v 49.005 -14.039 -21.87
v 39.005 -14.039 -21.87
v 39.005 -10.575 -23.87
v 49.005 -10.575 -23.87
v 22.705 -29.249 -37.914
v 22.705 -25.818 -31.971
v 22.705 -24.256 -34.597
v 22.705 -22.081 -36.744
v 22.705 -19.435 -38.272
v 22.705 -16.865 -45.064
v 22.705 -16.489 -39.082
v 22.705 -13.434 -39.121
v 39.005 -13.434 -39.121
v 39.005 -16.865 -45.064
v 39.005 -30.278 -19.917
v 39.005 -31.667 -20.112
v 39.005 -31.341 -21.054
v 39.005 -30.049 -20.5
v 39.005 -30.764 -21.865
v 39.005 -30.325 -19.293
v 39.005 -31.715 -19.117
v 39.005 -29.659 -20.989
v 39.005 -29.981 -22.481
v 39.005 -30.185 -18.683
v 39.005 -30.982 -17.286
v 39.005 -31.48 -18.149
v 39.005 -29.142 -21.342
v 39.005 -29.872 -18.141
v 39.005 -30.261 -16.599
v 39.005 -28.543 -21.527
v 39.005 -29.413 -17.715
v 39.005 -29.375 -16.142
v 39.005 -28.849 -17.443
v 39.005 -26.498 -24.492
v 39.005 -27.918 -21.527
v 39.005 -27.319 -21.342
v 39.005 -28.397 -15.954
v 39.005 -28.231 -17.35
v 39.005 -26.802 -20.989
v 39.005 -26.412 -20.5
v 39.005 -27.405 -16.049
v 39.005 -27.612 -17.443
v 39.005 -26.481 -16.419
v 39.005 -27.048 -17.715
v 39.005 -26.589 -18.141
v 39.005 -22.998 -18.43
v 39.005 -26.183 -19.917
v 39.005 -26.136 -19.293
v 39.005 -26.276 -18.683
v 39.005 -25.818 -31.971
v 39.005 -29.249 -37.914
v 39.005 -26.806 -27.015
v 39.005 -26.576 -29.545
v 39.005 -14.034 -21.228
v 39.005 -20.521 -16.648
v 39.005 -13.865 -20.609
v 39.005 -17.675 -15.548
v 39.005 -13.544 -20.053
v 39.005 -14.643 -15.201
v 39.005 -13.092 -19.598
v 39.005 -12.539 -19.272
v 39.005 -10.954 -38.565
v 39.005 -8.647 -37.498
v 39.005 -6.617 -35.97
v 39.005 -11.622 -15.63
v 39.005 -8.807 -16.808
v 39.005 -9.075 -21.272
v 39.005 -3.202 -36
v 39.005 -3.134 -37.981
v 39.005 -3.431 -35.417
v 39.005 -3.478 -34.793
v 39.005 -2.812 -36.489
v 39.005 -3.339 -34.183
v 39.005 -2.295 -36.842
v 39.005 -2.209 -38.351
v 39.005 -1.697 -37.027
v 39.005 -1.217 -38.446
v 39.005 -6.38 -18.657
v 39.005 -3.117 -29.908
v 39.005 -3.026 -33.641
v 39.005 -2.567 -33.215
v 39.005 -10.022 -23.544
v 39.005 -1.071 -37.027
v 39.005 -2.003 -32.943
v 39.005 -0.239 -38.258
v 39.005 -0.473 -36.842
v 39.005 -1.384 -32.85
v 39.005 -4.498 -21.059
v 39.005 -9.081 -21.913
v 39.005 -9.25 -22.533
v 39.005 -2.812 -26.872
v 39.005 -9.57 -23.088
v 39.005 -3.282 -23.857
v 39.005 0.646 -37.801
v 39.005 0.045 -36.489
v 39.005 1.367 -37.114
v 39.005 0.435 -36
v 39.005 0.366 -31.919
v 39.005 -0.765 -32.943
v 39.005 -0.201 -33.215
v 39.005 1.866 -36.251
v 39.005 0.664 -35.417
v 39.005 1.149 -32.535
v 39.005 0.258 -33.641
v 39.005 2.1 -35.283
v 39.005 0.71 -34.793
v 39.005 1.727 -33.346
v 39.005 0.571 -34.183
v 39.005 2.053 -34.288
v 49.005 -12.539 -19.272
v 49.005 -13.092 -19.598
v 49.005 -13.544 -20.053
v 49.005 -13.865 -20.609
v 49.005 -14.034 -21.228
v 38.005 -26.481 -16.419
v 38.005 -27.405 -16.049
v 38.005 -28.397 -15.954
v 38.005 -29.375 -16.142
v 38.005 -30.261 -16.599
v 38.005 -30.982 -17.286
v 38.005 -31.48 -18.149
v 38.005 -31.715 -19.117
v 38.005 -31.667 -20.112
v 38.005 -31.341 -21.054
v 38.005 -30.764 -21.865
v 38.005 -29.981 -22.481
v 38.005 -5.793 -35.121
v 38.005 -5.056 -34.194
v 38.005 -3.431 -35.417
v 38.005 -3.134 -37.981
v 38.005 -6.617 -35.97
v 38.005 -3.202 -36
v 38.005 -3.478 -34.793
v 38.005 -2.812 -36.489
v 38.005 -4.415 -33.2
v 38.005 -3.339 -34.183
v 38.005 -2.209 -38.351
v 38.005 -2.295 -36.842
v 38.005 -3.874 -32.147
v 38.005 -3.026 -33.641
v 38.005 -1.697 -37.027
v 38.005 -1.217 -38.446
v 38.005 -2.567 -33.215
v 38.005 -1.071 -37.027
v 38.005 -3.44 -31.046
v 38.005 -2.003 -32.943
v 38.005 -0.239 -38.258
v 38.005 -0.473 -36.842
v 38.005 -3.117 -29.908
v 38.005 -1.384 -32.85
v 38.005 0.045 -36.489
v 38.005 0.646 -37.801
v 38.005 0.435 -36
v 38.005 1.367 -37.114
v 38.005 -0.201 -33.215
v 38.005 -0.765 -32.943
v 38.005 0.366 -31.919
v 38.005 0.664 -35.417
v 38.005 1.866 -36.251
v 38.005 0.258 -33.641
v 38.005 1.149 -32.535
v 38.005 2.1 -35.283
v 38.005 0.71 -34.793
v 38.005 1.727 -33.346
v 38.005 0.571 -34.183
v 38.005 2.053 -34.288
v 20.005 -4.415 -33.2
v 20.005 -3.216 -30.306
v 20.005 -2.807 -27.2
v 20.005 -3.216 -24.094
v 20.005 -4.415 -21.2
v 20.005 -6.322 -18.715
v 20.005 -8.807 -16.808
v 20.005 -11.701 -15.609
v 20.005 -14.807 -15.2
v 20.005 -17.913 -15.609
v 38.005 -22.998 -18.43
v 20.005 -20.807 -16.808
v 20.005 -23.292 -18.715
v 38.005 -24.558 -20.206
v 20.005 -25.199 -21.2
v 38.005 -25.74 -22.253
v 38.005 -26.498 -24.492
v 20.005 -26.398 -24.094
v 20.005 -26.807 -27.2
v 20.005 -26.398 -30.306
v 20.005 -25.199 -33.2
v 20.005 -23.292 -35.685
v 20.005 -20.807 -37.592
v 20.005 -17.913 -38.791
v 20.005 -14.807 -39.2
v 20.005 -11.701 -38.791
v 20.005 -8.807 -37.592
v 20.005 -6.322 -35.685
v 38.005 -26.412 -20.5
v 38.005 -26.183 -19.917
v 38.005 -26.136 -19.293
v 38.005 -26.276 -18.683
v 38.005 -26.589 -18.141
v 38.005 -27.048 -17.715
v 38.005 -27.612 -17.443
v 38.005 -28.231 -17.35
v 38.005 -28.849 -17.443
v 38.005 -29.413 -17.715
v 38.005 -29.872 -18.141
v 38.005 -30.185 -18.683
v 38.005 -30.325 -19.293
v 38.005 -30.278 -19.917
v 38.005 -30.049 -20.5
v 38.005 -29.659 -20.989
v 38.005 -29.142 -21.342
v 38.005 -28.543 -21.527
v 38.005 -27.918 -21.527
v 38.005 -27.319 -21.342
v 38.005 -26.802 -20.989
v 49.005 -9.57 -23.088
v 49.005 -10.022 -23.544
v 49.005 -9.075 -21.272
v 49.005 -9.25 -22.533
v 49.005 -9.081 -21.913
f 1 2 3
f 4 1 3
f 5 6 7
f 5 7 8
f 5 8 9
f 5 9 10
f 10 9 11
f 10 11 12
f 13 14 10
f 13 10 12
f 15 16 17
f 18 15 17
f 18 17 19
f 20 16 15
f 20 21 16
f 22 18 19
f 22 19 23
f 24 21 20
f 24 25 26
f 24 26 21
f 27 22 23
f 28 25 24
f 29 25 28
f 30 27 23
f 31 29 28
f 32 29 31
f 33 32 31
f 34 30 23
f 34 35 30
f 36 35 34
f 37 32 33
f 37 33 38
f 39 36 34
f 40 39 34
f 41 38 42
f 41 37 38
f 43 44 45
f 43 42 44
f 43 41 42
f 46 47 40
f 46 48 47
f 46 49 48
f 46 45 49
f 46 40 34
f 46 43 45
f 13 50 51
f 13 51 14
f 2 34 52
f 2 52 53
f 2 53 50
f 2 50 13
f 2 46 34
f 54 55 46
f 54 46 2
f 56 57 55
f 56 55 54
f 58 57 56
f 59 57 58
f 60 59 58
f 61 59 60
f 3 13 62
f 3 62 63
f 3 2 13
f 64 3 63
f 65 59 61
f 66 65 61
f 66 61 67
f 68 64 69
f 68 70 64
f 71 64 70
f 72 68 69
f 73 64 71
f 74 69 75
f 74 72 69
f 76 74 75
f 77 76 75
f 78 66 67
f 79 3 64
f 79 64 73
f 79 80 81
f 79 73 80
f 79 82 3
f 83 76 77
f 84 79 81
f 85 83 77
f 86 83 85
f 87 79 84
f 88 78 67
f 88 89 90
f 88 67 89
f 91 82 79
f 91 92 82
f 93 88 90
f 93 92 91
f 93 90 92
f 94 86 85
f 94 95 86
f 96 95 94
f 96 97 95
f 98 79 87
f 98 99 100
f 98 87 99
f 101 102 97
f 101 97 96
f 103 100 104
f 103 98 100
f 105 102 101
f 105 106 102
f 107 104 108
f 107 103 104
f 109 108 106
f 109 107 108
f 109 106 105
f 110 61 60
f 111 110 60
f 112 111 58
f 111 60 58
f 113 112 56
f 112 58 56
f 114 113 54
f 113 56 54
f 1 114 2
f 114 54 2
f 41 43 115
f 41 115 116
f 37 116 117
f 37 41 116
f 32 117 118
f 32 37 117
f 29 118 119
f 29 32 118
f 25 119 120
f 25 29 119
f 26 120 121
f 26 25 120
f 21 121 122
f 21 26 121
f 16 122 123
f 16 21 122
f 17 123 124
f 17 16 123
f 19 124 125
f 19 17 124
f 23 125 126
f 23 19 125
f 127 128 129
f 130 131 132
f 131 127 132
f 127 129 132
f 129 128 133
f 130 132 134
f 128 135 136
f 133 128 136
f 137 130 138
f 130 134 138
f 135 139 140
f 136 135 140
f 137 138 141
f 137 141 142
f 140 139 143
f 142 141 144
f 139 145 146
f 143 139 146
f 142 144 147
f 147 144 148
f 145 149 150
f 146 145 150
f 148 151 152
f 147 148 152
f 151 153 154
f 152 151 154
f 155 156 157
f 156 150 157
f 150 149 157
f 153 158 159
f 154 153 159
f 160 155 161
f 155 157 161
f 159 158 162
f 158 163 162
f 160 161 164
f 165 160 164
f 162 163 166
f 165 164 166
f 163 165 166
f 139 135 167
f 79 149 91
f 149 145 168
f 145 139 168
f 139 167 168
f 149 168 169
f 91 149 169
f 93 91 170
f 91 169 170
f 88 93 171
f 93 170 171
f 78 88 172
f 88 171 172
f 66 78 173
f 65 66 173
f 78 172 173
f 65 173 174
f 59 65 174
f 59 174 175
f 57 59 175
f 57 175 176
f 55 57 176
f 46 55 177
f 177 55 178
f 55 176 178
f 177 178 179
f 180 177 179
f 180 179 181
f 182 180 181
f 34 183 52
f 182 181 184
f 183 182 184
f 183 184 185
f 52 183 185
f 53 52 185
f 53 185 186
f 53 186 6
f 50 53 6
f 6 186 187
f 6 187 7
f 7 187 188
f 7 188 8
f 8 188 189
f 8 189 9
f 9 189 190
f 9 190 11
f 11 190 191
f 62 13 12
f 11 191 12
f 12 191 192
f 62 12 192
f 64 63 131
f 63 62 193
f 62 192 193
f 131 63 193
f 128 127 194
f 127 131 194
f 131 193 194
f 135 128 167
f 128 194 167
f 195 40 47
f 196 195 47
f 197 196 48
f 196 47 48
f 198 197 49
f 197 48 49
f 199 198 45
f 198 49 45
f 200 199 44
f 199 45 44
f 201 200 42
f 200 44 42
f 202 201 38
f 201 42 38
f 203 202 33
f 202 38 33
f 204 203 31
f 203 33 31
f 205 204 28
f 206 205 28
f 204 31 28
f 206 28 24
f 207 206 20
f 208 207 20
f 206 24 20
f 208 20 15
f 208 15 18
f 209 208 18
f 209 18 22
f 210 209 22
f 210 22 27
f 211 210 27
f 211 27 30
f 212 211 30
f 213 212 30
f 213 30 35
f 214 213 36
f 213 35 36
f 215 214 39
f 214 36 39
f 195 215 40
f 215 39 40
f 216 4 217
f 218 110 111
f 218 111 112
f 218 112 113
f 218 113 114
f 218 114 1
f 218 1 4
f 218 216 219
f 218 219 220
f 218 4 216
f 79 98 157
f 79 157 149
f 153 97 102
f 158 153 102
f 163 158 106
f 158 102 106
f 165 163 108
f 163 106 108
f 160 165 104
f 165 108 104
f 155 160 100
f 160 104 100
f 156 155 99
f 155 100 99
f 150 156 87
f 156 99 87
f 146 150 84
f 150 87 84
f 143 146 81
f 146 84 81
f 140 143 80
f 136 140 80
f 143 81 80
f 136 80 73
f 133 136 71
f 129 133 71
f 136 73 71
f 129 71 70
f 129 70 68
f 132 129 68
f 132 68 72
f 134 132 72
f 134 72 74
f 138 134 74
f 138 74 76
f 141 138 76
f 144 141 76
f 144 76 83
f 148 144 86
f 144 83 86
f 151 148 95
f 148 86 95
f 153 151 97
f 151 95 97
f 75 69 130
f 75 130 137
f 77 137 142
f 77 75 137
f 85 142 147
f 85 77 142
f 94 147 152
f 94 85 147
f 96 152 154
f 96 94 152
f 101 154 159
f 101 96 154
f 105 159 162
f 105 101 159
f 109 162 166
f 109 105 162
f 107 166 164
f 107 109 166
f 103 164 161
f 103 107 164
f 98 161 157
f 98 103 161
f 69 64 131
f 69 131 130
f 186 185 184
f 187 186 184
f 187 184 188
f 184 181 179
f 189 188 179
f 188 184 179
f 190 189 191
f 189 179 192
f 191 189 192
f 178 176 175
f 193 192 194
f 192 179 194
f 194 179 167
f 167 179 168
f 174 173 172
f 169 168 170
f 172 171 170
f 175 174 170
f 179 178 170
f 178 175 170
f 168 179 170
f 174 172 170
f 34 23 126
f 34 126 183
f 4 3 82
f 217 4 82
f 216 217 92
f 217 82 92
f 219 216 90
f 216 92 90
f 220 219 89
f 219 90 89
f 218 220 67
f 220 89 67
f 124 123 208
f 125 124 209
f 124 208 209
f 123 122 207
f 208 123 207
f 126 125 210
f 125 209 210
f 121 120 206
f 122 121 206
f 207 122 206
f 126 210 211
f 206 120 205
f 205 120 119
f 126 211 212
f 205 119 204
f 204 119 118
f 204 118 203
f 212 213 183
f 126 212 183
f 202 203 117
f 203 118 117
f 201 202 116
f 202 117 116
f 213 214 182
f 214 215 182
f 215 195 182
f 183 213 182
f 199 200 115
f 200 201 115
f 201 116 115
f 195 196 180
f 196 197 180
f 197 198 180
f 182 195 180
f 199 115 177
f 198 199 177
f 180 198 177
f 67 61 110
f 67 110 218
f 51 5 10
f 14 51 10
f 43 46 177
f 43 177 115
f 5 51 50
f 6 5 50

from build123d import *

# Parameters (mm, degrees)
SKETCH034_R             = 12
PAD014_DEPTH            = 19
SKETCH035_W             = 14.3
SKETCH035_H             = 10
PAD015_DEPTH            = 16.3
SKETCH036_R             = 2.1
PAD016_DEPTH            = 1
PAD017_DEPTH            = 10
BODY007_ROLL_ANGLE      = 90
BODY007_PITCH_ANGLE     = 30
BODY007_PLACEMENT_ANGLE = 90


with BuildPart() as part:
    # Sketch034 → Pad014 (new body)
    with BuildSketch(Plane.XY):
        Circle(SKETCH034_R)
    extrude(amount=PAD014_DEPTH)

    # Sketch035 (on Face3 of Pad014) → Pad015 (join)
    with BuildSketch(Plane.XY.offset(19)):
        with Locations((0, -11.5)):
            Rectangle(SKETCH035_W, SKETCH035_H)
    extrude(amount=-PAD015_DEPTH)

    # Sketch036 (on Face3 of Pad015) → Pad016 (join)
    with BuildSketch(Plane.XY.offset(19)):
        with BuildLine():
            ThreePointArc((15.5, -3.5), (19, 0), (15.5, 3.5))
            Line((15.5, 3.5), (-15.5, 3.5))
            ThreePointArc((-15.5, 3.5), (-19, 0), (-15.5, -3.5))
            Line((-15.5, -3.5), (15.5, -3.5))
        make_face()
        with Locations((15.5, 0)):
            Circle(SKETCH036_R, mode=Mode.SUBTRACT)
        with Locations((-15.5, 0)):
            Circle(SKETCH036_R, mode=Mode.SUBTRACT)
    extrude(amount=-PAD016_DEPTH)

    # Sketch037 (on Face11 of Pad016) → Pad017 (join)
    with BuildSketch(Plane.XY.offset(19)):
        with BuildLine():
            ThreePointArc((-2, 8), (-2.5, 6.5), (-2, 5))
            Line((-2, 5), (2, 5))
            ThreePointArc((2, 5), (2.5, 6.5), (2, 8))
            Line((-2, 8), (2, 8))
        make_face()
    extrude(amount=PAD017_DEPTH)


with BuildPart() as part_1:
    # Body007 roll: moved
    add(part.part.rotate(Axis((0, 0, 0), (1, 0, 0)), BODY007_ROLL_ANGLE))


with BuildPart() as part_2:
    # Body007 pitch: moved
    add(part_1.part.rotate(Axis((0, 0, 0), (0, 1, 0)), BODY007_PITCH_ANGLE))


with BuildPart() as part_3:
    # Body007 placement: moved
    add(part_2.part.moved(Location((20.005183, -14.807107, -27.2))).rotate(Axis((20.005183, -14.807107, -27.2), (0, 0, 1)), BODY007_PLACEMENT_ANGLE))


solid = part_3.part
